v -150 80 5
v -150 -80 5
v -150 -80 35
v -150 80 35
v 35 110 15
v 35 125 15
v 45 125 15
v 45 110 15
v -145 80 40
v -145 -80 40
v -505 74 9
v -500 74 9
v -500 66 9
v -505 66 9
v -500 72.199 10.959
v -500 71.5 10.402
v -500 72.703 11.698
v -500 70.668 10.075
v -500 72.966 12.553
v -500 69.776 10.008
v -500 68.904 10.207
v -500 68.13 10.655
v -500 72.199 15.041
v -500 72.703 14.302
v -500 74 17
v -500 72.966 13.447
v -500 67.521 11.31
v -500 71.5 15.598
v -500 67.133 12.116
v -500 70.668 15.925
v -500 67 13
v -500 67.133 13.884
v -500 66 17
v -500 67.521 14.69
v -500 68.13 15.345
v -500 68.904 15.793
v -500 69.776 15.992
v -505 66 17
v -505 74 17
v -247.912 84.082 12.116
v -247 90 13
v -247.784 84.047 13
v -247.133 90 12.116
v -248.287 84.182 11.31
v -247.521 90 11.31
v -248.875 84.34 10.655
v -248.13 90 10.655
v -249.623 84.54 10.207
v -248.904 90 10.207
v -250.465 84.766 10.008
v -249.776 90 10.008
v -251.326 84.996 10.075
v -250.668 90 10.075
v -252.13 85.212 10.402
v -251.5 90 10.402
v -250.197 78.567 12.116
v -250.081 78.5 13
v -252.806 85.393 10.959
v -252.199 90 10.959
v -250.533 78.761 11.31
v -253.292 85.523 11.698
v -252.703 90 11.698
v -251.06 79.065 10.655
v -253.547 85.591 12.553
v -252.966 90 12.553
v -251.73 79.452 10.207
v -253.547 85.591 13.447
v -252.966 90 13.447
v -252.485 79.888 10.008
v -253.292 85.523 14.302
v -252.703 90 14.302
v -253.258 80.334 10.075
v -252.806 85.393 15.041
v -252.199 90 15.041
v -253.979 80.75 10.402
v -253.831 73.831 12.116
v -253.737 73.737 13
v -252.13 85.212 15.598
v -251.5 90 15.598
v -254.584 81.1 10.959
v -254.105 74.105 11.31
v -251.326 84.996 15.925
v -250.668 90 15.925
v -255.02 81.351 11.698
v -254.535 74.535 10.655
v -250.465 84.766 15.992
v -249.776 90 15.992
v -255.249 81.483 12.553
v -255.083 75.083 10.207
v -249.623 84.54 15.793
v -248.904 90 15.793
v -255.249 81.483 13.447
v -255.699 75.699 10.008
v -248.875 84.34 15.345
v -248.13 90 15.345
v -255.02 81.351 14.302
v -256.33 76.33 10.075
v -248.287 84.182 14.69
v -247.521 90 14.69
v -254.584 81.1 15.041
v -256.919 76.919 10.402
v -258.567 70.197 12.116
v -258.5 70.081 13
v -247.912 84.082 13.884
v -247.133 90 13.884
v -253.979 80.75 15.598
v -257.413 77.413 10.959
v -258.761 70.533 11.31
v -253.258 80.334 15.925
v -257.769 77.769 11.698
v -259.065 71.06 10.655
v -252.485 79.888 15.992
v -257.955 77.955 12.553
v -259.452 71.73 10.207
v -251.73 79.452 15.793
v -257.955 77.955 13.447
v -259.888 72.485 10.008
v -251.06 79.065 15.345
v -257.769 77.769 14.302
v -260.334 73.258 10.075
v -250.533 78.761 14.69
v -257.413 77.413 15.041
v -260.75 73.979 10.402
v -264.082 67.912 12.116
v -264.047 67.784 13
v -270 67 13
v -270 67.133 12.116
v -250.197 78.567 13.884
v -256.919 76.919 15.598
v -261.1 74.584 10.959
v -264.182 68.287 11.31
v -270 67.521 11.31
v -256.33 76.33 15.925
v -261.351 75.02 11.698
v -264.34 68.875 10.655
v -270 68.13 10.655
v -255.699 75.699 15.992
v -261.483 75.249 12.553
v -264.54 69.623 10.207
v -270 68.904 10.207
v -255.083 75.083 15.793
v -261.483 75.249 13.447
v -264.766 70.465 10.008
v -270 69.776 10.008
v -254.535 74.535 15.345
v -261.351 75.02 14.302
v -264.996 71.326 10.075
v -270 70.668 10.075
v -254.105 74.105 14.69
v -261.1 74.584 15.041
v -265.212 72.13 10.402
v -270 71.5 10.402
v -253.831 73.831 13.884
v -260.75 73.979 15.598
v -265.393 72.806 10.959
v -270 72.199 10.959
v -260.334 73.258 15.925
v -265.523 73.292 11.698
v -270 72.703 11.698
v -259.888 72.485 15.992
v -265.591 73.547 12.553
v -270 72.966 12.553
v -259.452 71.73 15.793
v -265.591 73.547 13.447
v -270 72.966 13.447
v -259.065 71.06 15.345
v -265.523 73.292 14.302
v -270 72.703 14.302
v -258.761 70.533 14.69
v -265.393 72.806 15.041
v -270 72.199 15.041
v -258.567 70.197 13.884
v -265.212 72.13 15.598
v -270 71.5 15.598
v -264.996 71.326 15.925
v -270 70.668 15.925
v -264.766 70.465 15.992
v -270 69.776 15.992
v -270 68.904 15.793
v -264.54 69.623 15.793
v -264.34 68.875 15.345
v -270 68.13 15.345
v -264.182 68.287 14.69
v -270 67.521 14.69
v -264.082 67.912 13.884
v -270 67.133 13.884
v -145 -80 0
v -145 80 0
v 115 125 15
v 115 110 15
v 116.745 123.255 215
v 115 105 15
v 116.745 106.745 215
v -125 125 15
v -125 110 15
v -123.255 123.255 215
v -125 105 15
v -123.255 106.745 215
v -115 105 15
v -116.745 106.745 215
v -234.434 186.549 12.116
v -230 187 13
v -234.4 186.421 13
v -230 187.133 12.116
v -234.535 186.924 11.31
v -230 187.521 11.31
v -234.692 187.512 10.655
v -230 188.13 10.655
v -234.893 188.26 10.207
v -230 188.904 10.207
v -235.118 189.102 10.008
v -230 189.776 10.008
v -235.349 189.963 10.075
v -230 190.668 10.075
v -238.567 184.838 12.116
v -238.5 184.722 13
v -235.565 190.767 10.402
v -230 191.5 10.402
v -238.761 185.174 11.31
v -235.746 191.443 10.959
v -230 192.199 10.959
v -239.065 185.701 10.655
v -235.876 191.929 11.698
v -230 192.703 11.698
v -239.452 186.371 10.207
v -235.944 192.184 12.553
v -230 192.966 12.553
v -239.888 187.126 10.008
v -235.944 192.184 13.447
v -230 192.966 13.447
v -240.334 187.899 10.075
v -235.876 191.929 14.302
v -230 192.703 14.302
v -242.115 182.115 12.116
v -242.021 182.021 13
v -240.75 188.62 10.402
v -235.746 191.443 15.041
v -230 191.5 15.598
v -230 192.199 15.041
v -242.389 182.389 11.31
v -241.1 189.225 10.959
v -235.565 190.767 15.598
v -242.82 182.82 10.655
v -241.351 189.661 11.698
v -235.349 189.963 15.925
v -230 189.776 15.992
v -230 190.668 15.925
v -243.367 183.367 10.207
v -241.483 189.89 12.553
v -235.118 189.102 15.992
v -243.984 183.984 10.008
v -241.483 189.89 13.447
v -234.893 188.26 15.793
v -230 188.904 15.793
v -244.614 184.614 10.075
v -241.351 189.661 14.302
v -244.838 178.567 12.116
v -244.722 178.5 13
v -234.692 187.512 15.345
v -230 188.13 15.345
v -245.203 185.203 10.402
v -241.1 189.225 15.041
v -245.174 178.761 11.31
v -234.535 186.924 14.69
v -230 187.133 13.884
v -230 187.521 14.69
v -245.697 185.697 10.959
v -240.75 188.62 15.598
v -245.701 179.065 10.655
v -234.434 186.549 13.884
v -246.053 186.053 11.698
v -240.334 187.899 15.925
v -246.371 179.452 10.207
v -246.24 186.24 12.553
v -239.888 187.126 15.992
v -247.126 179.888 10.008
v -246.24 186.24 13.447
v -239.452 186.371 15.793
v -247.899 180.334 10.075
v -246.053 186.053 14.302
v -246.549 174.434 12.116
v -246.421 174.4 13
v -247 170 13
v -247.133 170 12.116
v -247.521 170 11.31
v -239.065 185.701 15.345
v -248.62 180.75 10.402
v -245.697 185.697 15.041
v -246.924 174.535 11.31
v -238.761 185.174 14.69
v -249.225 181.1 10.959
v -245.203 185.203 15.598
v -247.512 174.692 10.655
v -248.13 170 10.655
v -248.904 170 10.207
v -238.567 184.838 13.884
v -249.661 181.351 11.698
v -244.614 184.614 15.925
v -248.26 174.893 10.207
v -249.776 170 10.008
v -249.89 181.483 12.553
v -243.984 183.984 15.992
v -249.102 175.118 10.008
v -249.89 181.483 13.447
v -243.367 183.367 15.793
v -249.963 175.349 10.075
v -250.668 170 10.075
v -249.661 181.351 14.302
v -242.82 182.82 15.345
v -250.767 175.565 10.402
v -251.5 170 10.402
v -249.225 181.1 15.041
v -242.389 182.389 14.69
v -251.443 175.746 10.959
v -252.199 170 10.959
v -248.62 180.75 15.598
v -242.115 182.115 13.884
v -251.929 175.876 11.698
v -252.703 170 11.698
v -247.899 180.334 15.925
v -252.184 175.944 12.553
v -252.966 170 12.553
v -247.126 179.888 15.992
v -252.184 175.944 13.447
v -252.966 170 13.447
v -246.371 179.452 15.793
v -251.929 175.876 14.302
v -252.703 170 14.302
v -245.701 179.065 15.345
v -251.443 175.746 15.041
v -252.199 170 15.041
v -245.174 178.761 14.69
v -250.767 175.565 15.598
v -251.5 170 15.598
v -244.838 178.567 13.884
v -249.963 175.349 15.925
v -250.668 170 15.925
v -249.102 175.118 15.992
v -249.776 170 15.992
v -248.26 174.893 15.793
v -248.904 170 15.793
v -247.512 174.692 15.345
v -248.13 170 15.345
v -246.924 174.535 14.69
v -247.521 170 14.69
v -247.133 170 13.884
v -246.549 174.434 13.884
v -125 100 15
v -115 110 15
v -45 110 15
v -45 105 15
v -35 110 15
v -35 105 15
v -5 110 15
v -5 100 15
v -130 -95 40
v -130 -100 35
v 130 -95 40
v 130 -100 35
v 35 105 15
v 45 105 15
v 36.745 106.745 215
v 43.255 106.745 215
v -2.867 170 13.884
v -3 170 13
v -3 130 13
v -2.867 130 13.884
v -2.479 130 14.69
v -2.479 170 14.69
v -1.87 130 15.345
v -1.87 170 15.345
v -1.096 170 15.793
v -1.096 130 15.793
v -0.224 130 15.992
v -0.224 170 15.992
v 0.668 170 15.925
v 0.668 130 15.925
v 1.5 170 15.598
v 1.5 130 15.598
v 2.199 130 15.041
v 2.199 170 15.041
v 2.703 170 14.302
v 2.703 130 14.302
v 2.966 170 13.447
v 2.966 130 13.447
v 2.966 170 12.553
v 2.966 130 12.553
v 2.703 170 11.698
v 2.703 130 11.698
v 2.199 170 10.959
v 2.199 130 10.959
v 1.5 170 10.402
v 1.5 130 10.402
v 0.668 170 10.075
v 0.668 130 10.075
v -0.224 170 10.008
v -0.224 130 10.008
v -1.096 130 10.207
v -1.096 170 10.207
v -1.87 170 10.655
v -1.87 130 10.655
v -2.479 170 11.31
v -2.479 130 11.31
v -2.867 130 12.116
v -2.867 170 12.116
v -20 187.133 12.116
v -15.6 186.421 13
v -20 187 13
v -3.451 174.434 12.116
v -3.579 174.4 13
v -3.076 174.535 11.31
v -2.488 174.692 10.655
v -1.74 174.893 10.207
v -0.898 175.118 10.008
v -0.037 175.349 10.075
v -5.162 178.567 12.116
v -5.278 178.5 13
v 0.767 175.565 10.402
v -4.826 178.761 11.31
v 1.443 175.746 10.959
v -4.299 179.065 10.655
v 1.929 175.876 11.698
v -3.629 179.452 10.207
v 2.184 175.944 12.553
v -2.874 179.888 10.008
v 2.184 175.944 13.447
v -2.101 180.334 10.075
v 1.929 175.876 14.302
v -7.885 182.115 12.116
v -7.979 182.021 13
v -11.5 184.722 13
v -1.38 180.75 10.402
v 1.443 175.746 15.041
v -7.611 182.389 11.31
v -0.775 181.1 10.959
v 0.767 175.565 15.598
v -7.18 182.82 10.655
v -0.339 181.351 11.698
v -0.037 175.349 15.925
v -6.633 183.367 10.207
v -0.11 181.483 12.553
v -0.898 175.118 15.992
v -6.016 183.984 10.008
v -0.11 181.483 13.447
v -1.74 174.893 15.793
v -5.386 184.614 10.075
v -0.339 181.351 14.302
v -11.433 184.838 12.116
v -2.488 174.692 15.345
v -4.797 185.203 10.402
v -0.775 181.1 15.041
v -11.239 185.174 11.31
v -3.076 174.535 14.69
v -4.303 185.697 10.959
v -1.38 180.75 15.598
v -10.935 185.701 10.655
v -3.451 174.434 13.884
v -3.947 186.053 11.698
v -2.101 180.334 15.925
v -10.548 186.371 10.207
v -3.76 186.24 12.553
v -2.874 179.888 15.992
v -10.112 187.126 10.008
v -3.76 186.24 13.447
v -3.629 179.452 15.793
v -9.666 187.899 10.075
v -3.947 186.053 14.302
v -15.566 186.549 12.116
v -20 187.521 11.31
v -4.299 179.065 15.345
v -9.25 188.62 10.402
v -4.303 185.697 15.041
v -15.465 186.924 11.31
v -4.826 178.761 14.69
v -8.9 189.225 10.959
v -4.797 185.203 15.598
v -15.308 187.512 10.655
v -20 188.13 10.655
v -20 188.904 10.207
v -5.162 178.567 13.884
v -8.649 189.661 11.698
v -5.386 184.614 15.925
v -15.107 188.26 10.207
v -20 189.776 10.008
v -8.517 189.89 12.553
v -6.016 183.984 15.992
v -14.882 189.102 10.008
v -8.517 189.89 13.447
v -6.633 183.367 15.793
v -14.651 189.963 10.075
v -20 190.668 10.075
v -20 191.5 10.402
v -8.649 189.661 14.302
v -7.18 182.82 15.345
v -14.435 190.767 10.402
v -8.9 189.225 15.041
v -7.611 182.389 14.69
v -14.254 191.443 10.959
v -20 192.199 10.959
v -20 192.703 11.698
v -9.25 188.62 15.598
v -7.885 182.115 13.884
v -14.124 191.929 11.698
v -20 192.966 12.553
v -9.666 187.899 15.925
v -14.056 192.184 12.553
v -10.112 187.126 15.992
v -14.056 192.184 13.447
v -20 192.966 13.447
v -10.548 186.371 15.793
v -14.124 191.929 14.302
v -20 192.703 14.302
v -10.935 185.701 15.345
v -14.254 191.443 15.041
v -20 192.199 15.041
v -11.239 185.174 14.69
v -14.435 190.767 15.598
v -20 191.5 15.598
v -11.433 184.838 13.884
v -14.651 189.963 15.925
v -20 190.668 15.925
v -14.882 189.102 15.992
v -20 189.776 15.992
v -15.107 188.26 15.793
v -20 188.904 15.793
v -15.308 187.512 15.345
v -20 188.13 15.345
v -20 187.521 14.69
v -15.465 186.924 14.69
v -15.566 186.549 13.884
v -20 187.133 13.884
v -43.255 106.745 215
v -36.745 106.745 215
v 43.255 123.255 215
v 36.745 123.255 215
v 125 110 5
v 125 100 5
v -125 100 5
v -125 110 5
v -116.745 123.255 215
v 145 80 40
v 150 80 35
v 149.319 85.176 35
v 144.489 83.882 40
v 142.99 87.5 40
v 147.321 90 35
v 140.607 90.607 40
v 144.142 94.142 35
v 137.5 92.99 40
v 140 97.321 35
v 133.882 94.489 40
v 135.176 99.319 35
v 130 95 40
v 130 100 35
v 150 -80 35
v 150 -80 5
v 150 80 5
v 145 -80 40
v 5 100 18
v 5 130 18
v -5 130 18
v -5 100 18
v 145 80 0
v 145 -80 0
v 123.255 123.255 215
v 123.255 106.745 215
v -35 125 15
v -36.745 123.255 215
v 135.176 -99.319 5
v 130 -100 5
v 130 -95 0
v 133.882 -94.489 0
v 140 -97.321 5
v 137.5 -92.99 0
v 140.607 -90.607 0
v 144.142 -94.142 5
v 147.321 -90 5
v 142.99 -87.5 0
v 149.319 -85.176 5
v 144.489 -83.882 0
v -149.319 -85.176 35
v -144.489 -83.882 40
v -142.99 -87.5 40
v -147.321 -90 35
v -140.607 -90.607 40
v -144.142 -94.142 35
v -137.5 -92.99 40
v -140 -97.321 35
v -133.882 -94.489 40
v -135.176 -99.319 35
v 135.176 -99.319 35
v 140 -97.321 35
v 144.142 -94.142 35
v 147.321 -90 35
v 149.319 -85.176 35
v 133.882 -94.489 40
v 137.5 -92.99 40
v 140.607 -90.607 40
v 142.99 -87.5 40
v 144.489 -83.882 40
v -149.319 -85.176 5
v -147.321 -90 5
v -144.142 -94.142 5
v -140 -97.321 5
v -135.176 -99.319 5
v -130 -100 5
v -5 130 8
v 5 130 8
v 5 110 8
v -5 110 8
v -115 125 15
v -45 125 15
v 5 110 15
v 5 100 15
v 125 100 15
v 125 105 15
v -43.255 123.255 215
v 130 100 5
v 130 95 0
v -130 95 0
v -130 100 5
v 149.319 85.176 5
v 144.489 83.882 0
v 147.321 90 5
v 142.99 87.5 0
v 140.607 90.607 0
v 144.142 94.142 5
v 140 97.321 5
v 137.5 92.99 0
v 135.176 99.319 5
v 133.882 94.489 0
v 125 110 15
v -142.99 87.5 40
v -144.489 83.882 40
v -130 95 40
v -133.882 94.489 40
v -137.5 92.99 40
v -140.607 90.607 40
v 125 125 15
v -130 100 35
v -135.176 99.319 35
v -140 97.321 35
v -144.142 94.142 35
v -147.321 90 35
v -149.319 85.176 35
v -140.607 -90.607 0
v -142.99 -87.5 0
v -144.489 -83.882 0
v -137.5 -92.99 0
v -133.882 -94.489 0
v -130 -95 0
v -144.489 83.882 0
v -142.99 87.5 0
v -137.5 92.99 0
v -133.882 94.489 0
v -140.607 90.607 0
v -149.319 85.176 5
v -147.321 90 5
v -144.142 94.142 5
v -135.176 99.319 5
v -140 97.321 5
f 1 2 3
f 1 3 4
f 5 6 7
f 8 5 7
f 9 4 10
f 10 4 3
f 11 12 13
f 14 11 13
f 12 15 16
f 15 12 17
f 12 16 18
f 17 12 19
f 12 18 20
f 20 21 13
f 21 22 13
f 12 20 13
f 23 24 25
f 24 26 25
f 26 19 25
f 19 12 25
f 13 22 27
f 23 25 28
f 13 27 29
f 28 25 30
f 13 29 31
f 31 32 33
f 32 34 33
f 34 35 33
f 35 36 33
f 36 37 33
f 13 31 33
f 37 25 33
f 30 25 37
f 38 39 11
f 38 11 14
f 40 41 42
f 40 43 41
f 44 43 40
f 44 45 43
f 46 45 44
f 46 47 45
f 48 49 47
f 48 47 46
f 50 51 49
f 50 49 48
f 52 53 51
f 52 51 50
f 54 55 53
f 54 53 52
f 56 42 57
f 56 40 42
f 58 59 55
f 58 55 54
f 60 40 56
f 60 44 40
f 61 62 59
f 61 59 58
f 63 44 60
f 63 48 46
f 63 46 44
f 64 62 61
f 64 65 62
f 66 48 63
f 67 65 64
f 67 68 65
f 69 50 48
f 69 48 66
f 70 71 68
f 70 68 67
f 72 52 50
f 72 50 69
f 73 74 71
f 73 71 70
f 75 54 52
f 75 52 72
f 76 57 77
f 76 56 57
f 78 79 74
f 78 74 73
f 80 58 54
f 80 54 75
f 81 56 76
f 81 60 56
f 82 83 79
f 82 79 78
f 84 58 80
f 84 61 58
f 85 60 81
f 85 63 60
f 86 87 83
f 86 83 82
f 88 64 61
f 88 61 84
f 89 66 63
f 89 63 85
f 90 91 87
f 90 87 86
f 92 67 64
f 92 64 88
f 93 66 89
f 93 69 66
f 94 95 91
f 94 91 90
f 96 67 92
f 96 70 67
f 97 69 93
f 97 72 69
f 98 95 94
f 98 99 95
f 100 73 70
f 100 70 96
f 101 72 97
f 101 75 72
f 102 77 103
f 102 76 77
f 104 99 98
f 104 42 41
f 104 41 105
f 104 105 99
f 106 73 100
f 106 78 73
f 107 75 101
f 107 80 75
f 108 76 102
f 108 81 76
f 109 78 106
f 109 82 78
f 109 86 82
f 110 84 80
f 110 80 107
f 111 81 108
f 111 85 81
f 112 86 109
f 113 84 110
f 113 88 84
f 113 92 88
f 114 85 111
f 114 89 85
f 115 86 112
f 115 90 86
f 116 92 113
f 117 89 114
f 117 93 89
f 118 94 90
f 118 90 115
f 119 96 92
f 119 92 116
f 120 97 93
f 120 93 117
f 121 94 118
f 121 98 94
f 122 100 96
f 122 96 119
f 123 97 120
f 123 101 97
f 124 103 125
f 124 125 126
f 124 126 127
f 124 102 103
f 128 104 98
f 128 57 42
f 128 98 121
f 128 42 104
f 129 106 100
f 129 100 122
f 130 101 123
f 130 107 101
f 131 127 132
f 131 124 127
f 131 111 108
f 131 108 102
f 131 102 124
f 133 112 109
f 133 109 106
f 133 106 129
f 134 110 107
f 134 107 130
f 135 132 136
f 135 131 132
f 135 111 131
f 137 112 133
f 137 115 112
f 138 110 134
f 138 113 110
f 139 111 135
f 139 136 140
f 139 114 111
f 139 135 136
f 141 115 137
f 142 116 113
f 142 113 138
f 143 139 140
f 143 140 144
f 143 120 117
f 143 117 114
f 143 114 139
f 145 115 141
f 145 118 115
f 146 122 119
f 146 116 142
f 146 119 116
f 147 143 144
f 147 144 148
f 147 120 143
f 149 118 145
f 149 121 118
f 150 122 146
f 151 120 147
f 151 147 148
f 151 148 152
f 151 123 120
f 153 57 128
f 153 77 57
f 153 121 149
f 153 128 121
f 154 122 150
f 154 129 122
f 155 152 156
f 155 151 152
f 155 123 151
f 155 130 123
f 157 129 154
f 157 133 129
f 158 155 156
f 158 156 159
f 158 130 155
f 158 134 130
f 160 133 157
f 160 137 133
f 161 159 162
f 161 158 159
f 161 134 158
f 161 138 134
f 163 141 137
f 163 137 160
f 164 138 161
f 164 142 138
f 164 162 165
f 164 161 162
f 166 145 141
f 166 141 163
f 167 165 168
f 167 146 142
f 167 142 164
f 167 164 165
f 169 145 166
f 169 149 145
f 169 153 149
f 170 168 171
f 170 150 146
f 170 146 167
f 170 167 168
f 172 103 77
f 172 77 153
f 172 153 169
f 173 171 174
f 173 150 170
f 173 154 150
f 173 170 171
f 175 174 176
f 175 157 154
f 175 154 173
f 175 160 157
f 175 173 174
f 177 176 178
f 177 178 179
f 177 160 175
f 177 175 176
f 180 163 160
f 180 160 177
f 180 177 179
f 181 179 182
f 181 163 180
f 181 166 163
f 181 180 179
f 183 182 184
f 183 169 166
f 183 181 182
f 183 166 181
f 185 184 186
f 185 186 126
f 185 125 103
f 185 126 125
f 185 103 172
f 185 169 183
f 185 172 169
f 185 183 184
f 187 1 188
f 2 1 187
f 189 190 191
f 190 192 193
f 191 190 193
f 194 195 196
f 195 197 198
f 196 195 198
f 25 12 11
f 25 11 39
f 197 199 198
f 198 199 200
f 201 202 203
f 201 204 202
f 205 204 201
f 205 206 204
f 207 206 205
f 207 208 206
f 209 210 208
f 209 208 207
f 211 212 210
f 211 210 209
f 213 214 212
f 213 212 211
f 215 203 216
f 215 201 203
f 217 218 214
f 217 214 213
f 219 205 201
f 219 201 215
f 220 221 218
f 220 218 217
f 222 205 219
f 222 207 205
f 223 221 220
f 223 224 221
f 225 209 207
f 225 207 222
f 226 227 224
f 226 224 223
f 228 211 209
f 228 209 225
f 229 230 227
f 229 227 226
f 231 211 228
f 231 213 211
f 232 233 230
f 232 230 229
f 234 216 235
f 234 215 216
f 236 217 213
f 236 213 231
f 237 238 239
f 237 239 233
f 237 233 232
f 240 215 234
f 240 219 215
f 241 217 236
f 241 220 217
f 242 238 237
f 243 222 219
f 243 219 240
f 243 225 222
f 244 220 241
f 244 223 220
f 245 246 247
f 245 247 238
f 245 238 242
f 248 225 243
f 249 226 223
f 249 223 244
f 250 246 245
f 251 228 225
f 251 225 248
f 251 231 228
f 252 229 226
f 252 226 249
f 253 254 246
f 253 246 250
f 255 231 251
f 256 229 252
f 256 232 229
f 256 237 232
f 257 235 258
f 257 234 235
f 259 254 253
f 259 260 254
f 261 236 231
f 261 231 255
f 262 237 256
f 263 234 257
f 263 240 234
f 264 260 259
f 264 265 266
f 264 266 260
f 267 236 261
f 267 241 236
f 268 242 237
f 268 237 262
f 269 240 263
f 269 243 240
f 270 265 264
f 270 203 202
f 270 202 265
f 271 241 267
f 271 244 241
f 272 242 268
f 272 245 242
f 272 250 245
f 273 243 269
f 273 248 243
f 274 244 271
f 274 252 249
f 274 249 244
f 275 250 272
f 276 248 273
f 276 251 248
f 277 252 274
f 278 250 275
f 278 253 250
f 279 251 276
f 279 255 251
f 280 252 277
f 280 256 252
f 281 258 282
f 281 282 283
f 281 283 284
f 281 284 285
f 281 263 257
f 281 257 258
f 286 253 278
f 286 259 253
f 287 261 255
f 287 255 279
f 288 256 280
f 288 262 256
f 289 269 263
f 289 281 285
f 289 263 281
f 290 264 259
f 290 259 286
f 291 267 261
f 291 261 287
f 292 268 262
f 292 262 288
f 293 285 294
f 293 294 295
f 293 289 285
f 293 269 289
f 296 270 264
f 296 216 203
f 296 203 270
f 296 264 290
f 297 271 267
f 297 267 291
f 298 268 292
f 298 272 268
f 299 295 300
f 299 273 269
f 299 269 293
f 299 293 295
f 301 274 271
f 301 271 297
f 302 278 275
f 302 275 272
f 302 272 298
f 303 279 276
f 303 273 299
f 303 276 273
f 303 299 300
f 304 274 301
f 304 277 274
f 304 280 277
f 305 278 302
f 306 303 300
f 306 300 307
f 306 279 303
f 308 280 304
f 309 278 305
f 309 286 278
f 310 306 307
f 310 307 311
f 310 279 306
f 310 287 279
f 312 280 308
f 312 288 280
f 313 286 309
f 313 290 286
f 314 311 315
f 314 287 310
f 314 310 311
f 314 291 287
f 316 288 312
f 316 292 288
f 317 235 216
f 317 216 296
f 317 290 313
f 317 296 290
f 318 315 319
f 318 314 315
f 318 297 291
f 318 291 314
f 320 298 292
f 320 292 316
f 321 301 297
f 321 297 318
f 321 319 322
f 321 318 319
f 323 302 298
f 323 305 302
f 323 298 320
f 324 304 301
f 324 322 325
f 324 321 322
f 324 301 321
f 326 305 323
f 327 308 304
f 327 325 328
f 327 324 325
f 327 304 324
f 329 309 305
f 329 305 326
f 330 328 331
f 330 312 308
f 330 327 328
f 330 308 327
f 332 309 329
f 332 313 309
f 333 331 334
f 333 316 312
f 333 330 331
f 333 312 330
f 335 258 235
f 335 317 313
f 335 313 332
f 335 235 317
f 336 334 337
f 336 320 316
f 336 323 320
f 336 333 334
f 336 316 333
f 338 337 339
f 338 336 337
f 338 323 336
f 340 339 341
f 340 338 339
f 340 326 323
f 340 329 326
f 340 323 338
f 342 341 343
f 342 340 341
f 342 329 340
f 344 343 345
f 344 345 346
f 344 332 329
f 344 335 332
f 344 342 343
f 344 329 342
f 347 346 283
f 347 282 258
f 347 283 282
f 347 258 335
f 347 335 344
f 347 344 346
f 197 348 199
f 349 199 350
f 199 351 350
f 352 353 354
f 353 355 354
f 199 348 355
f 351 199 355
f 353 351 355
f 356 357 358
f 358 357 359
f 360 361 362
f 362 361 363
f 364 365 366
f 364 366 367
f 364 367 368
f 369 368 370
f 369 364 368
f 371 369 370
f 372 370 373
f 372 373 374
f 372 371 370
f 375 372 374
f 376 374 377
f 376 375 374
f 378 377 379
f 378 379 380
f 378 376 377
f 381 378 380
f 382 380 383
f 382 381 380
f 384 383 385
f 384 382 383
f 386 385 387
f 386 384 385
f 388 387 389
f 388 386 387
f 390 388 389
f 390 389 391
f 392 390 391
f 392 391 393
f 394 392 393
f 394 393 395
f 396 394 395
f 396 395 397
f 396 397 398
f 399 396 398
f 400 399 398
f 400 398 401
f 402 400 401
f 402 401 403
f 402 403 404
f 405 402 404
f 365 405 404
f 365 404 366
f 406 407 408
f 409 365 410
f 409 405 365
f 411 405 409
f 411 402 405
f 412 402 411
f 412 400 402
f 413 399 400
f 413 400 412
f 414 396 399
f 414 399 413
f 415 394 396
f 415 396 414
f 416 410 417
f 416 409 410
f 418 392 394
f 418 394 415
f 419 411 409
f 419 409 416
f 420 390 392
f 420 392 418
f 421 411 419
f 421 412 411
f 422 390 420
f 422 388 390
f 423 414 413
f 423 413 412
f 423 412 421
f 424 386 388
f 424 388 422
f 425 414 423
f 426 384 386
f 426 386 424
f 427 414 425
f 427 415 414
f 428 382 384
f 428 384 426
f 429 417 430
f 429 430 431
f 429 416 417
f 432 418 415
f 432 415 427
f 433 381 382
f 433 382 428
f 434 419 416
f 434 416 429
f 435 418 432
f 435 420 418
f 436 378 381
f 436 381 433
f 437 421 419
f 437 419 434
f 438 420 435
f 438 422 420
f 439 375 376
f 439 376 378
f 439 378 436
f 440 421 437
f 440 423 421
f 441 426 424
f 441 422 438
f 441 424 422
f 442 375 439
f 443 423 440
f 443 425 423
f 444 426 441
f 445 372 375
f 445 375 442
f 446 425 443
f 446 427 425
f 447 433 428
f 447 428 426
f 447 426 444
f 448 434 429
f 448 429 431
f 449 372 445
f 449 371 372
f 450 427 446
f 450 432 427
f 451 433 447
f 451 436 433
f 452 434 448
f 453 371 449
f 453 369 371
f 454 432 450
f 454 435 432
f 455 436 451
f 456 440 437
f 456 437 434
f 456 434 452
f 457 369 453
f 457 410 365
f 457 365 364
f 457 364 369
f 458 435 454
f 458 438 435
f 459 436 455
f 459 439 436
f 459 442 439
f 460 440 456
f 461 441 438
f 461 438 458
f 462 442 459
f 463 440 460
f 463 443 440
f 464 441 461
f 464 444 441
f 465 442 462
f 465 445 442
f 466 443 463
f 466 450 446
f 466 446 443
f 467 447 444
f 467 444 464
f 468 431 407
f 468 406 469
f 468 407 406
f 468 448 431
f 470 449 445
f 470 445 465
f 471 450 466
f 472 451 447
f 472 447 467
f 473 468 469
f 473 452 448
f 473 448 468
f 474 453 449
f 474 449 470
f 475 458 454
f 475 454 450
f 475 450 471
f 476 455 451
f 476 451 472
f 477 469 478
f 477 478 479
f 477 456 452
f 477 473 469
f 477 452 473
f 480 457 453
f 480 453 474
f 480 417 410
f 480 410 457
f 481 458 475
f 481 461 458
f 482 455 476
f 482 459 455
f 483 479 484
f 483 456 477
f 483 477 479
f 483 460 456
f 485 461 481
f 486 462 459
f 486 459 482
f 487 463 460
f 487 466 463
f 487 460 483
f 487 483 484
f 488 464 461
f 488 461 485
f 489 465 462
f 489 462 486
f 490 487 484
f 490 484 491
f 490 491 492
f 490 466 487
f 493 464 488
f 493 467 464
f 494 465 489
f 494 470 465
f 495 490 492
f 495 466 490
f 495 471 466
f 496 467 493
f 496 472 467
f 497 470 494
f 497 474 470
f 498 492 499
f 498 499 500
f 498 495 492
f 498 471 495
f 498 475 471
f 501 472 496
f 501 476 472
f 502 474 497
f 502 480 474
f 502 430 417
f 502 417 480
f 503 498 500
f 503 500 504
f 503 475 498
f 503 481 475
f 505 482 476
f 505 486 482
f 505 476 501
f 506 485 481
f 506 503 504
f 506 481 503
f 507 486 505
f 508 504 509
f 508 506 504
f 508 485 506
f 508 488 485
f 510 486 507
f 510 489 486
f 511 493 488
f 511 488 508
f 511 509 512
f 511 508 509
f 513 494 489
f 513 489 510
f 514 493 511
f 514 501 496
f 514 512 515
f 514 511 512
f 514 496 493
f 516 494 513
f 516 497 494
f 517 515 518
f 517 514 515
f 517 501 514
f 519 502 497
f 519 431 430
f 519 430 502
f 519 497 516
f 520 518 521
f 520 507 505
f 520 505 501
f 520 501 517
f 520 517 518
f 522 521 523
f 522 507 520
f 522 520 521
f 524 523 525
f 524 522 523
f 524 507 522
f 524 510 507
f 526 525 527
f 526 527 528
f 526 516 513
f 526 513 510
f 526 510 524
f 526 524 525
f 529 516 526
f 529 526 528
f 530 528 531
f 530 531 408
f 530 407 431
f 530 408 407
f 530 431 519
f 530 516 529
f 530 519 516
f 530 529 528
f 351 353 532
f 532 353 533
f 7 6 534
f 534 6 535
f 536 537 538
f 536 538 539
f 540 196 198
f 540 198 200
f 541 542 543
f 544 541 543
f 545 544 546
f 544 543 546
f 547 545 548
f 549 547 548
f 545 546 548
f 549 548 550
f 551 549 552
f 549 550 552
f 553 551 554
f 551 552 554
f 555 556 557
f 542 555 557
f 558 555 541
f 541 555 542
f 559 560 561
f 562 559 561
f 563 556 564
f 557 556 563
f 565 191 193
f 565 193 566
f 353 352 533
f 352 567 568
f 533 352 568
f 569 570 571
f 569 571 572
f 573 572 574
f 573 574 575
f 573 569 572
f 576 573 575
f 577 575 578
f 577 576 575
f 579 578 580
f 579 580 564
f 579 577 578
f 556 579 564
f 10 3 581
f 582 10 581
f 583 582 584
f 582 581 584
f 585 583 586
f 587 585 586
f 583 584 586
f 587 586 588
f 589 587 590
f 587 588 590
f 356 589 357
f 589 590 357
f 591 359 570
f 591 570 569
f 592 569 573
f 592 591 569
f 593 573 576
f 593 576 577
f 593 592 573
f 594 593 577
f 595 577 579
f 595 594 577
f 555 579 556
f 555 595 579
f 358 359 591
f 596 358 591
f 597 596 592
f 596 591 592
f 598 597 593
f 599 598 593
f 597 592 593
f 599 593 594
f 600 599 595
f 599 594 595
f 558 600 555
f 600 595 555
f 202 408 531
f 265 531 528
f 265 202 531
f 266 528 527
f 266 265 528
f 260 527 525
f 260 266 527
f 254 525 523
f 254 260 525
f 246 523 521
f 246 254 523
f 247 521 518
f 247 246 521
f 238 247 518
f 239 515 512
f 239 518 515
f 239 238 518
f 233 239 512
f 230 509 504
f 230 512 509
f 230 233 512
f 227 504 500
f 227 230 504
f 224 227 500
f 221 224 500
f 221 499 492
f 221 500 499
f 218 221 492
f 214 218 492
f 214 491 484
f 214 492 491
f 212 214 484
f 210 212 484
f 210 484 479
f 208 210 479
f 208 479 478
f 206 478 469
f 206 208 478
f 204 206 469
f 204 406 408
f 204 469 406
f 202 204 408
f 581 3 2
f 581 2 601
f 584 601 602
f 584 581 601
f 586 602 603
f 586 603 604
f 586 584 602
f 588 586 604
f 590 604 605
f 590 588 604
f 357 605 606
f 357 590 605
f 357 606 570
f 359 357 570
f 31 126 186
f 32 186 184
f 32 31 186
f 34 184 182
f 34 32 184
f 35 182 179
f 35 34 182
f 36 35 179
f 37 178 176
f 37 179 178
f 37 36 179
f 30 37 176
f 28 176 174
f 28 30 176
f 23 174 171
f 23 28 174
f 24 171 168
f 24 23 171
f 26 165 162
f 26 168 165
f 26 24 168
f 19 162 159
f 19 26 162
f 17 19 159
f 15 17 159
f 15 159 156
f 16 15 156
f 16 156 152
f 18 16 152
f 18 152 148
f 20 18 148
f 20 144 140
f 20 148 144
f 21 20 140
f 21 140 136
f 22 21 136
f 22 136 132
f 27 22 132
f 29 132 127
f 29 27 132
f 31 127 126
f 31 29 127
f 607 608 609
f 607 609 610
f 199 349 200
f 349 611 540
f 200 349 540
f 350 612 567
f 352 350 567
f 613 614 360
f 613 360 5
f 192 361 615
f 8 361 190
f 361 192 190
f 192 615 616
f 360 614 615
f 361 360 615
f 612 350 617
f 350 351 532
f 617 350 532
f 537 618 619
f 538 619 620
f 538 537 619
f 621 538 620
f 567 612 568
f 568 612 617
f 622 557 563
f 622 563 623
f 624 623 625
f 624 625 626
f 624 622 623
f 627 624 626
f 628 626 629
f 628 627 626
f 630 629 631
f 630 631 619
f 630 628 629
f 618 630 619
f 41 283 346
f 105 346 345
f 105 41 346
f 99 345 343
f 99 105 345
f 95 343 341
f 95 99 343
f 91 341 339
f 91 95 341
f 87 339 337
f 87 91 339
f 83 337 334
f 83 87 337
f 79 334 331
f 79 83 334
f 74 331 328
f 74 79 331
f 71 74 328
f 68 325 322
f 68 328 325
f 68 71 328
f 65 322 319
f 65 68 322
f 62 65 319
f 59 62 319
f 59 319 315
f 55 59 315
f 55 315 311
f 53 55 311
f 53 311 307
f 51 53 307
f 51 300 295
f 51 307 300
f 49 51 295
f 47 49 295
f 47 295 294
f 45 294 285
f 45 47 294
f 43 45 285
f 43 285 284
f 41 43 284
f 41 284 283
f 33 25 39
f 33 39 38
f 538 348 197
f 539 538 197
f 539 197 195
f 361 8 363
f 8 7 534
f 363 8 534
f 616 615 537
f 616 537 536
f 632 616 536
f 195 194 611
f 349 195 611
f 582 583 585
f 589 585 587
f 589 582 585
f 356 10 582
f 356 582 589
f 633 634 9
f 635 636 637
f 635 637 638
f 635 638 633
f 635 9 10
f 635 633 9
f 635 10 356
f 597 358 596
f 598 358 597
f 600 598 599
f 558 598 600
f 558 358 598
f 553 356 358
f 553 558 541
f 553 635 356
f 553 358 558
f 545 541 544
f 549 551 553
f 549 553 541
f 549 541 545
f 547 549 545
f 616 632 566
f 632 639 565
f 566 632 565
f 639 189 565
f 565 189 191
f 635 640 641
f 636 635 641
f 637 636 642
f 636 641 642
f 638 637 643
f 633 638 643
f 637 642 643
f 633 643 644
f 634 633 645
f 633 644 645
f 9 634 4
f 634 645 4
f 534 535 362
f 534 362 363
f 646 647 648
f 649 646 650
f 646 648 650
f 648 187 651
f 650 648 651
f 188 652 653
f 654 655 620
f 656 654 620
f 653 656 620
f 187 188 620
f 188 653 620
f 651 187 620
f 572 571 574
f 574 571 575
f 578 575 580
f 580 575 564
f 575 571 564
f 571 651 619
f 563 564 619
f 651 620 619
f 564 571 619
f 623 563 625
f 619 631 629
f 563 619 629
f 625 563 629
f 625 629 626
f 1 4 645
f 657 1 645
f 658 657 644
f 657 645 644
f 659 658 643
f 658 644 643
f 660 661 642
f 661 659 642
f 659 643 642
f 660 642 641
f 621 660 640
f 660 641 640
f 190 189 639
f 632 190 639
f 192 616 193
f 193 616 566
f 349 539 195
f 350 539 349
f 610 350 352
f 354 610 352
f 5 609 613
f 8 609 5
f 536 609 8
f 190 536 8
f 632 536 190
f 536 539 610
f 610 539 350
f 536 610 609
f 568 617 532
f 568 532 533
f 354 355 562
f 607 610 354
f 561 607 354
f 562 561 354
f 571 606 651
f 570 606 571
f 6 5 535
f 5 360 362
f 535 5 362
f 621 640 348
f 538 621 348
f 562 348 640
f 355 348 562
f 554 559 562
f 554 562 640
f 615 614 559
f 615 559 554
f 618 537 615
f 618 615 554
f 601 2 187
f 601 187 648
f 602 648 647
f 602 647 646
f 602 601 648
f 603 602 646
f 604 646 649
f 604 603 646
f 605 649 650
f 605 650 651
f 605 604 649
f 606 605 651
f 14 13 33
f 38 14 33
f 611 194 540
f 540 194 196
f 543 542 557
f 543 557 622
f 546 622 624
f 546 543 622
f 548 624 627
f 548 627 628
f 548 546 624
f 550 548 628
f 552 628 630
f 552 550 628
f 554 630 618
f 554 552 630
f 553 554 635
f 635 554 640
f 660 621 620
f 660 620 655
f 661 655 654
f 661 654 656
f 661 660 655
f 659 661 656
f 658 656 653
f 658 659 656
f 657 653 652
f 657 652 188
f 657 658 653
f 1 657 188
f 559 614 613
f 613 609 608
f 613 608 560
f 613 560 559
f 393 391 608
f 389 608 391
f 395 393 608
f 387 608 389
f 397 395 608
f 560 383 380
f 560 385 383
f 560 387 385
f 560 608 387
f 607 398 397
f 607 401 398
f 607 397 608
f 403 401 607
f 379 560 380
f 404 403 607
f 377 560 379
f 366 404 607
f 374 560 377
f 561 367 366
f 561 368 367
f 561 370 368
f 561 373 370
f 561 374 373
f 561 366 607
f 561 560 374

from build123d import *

# Parameters (mm, degrees)
F0_W      = 300
F0_H      = 200
F1_DEPTH  = 40
F2_R      = 20
F3_SIZE   = 5
F4_W      = 20
F4_H      = 10
F5_DEPTH  = 125
F6_W      = 10
F6_H      = 20
F7_DEPTH  = 200
F7_TAPER  = 0.5
F8_W      = 10
F8_H      = 10
F9_DEPTH  = 20
F10_R     = 3
F14_W     = 8
F14_H     = 8
F15_DEPTH = 5


with BuildPart() as f1:
    # F0 (on Top) → F1 (new body)
    with BuildSketch(Plane.XY):
        Rectangle(F0_W, F0_H)
    extrude(amount=F1_DEPTH)

    # F2
    f2_edges = [f1.edges().sort_by_distance(p)[0] for p in [
        (-150, -100, 20),
        (150, -100, 20),
        (150, 100, 20),
        (-150, 100, 20),
    ]]
    fillet(f2_edges, radius=F2_R)

    # F3
    f3_edges = [f1.edges().sort_by_distance(p)[0] for p in [
        (0, -100, 40),
        (0, -100, 0),
    ]]
    chamfer(f3_edges, length=F3_SIZE)

    # F4 (on Right) → F5 (join, symmetric)
    with BuildSketch(Plane.YZ):
        with Locations((100, 10)):
            Rectangle(F4_W, F4_H)
    extrude(amount=F5_DEPTH, both=True)

    # F6 (on face) → F7 (join)
    with BuildSketch(Plane.XY.offset(15)):
        with Locations((-120, 115)):
            Rectangle(F6_W, F6_H)
        with Locations((-40, 115)):
            Rectangle(F6_W, F6_H)
        with Locations((40, 115)):
            Rectangle(F6_W, F6_H)
        with Locations((120, 115)):
            Rectangle(F6_W, F6_H)
    extrude(amount=F7_DEPTH, taper=F7_TAPER)

    # F8 (on face) → F9 (join, symmetric)
    with BuildSketch(Plane(origin=(0, 110, 0), x_dir=(-1, 0, 0), z_dir=(0, 1, 0))):
        with Locations((0, 13)):
            Rectangle(F8_W, F8_H)
    extrude(amount=F9_DEPTH, both=True)

    # F13: sweep along a path in F12
    with BuildLine(Plane.XY.offset(13)) as f13_path:
        Line((0, 130), (0, 150))
        Line((0, 150), (0, 170))
        ThreePointArc((0, 170), (-5.8578643763, 184.1421356237), (-20, 190))
        Line((-20, 190), (-230, 190))
        ThreePointArc((-230, 190), (-244.1421356237, 184.1421356237), (-250, 170))
        Line((-250, 170), (-250, 90))
        ThreePointArc((-250, 90), (-255.8578643763, 75.8578643763), (-270, 70))
        Line((-270, 70), (-500, 70))
    # F10 (on face) → F13 (sweep)
    with BuildSketch(Plane(origin=(0, 130, 0), x_dir=(-1, 0, 0), z_dir=(0, 1, 0))):
        with Locations((0, 13)):
            Circle(F10_R)
    sweep(path=f13_path.line)

    # F14 (on face) → F15 (join)
    with BuildSketch(Plane(origin=(-500, 0, 0), x_dir=(0, -1, 0), z_dir=(-1, 0, 0))):
        with Locations((-70, 13)):
            Rectangle(F14_W, F14_H)
    extrude(amount=F15_DEPTH)


solid = f1.part
